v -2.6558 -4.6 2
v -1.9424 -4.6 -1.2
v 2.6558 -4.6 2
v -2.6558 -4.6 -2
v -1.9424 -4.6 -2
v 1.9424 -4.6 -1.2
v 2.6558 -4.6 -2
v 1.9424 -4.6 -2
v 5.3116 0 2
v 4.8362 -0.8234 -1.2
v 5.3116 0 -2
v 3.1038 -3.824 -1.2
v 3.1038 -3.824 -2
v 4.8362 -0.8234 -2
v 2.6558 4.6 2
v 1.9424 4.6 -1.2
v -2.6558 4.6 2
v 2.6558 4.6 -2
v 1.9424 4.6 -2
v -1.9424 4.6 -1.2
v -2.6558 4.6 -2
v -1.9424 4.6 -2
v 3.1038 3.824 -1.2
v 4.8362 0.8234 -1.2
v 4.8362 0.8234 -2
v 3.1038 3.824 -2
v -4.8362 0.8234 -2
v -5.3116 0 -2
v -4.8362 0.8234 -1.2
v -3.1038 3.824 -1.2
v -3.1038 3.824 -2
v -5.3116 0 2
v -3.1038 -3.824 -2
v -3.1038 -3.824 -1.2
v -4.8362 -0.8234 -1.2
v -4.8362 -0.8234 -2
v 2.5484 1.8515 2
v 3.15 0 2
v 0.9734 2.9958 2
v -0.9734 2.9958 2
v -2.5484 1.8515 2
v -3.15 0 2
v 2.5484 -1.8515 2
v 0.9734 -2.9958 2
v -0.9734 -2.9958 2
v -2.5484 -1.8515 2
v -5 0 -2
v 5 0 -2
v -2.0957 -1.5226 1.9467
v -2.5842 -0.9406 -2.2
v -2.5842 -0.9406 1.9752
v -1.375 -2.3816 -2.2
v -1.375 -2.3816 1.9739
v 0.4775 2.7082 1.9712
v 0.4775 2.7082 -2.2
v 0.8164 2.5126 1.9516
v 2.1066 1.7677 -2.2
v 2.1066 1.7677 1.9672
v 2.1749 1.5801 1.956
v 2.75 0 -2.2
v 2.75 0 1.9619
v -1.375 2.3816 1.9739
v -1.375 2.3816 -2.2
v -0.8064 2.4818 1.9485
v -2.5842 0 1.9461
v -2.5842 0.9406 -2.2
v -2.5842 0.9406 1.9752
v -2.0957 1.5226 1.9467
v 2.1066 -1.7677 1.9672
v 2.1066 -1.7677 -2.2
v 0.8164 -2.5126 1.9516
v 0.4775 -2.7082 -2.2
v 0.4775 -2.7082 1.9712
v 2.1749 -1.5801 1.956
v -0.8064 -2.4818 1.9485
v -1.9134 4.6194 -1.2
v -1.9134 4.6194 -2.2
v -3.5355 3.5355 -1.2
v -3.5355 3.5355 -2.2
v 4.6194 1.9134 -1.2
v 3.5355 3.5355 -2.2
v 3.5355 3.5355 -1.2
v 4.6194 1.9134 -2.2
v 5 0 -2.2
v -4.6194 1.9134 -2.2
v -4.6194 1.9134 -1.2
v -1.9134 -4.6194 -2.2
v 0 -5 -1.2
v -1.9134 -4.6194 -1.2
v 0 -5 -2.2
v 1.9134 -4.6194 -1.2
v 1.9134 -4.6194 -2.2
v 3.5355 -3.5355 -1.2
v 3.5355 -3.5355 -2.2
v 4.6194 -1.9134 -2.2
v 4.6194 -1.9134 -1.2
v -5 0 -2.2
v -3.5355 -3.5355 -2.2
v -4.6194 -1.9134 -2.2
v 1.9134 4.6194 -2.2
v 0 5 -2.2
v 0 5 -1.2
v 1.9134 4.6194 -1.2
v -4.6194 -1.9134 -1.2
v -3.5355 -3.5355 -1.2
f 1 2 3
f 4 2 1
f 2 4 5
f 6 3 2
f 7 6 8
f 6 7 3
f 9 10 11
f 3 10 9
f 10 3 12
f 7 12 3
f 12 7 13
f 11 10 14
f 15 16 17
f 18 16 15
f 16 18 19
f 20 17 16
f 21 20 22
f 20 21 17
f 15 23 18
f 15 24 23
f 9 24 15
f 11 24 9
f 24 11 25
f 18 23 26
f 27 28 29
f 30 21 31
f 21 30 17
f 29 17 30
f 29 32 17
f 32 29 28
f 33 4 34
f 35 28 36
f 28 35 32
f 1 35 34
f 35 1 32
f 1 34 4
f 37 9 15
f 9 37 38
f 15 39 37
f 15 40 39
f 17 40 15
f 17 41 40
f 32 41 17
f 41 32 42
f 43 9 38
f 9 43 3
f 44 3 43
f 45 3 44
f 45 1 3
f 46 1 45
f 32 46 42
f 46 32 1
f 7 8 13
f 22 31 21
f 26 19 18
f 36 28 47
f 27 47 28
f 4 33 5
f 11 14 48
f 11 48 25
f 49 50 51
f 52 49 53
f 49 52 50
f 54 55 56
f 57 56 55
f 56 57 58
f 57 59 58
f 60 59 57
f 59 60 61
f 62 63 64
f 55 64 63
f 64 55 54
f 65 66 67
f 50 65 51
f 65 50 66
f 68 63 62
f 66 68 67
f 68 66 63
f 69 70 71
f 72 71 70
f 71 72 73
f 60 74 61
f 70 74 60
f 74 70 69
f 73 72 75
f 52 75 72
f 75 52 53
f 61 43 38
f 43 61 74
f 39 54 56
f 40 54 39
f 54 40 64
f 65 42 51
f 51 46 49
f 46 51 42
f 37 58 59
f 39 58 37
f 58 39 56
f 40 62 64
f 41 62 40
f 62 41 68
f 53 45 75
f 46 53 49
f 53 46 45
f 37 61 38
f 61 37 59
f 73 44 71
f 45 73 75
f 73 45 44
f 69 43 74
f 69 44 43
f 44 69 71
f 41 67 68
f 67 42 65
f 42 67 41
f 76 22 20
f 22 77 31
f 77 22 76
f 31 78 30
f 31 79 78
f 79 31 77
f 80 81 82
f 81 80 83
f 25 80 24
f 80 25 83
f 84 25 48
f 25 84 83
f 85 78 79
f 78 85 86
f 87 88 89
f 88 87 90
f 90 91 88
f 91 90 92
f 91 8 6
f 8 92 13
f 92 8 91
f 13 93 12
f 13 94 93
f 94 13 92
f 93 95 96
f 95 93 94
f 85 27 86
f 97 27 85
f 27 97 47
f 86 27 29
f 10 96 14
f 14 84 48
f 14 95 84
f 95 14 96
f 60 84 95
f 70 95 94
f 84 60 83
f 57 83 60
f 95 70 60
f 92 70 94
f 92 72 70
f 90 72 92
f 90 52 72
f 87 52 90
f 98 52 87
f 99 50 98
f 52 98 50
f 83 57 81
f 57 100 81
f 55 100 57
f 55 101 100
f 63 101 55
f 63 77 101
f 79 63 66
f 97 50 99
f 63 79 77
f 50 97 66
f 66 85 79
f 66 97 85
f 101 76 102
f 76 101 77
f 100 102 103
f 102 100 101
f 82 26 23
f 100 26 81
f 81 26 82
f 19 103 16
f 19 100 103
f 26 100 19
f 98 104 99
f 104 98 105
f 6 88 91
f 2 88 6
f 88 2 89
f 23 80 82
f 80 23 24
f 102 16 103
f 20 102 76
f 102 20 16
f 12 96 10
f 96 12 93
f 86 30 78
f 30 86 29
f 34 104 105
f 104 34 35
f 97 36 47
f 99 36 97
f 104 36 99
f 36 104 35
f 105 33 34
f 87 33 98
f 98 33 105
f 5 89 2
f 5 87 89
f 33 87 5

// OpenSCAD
// Parameters
thread_nominal_diameter_mm = 5; //[2.5:10:0.1]
thread_pitch_mm = 0.8; //[0.4:1.6:0.05]
across_flats_mm = 9.2; //[4.6:18.4:0.1]
thickness_mm = 4; //[2:8:0.1]
hole_clearance_mm = 0.5; //[0.1:1.2:0.05]
hole_tap_allowance_mm = 0.2; //[0.05:0.5:0.05]
hole_mode = 0; //[0:1:1]
lead_in_chamfer_mm = 0.3; //[0.1:0.8:0.05]
chamfer_radial_extra_mm = 0.4; //[0.1:1.2:0.05]
washer_outer_diameter_mm = 10; //[6:20:0.1]
washer_thickness_mm = 1; //[0.5:2.5:0.1]
overlap_mm = 0.8; //[0.2:2:0.1]
cut_extra_mm = 1; //[0.5:3:0.1]

// Nut and Washer - complete geometry
module nut_and_washer() {
  color("DimGray") {
    // Hex Nut Body
    difference() {
      cylinder(r=across_flats_mm/(2*cos(30)), h=thickness_mm, center=true, $fn=6);
      // Central Thread Hole
      cylinder(r=((thread_nominal_diameter_mm + hole_clearance_mm)*(1-hole_mode) + 
                  (thread_nominal_diameter_mm - hole_tap_allowance_mm)*hole_mode)/2, 
               h=thickness_mm + 2*cut_extra_mm, center=true);
      // Chamfer or Lead-in Edges Top
      translate([0, 0, thickness_mm/2 - lead_in_chamfer_mm/2])
        rotate([180, 0, 0])
        cylinder(r1=((thread_nominal_diameter_mm + hole_clearance_mm)*(1-hole_mode) + 
                     (thread_nominal_diameter_mm - hole_tap_allowance_mm)*hole_mode)/2 + chamfer_radial_extra_mm, 
                 r2=0, h=lead_in_chamfer_mm, center=true);
      // Chamfer or Lead-in Edges Bottom
      translate([0, 0, -thickness_mm/2 + lead_in_chamfer_mm/2])
        cylinder(r1=((thread_nominal_diameter_mm + hole_clearance_mm)*(1-hole_mode) + 
                     (thread_nominal_diameter_mm - hole_tap_allowance_mm)*hole_mode)/2 + chamfer_radial_extra_mm, 
                 r2=0, h=lead_in_chamfer_mm, center=true);
    }
    
    // Washer Ring
    translate([0, 0, -thickness_mm/2 - washer_thickness_mm/2 + overlap_mm])
      difference() {
        cylinder(r=washer_outer_diameter_mm/2, h=washer_thickness_mm, center=true);
        cylinder(r=((thread_nominal_diameter_mm + hole_clearance_mm)*(1-hole_mode) + 
                    (thread_nominal_diameter_mm - hole_tap_allowance_mm)*hole_mode)/2, 
                 h=washer_thickness_mm + 2*cut_extra_mm, center=true);
      }
  }
}

// Assembly
module assembly() {
  nut_and_washer();
}

assembly();
